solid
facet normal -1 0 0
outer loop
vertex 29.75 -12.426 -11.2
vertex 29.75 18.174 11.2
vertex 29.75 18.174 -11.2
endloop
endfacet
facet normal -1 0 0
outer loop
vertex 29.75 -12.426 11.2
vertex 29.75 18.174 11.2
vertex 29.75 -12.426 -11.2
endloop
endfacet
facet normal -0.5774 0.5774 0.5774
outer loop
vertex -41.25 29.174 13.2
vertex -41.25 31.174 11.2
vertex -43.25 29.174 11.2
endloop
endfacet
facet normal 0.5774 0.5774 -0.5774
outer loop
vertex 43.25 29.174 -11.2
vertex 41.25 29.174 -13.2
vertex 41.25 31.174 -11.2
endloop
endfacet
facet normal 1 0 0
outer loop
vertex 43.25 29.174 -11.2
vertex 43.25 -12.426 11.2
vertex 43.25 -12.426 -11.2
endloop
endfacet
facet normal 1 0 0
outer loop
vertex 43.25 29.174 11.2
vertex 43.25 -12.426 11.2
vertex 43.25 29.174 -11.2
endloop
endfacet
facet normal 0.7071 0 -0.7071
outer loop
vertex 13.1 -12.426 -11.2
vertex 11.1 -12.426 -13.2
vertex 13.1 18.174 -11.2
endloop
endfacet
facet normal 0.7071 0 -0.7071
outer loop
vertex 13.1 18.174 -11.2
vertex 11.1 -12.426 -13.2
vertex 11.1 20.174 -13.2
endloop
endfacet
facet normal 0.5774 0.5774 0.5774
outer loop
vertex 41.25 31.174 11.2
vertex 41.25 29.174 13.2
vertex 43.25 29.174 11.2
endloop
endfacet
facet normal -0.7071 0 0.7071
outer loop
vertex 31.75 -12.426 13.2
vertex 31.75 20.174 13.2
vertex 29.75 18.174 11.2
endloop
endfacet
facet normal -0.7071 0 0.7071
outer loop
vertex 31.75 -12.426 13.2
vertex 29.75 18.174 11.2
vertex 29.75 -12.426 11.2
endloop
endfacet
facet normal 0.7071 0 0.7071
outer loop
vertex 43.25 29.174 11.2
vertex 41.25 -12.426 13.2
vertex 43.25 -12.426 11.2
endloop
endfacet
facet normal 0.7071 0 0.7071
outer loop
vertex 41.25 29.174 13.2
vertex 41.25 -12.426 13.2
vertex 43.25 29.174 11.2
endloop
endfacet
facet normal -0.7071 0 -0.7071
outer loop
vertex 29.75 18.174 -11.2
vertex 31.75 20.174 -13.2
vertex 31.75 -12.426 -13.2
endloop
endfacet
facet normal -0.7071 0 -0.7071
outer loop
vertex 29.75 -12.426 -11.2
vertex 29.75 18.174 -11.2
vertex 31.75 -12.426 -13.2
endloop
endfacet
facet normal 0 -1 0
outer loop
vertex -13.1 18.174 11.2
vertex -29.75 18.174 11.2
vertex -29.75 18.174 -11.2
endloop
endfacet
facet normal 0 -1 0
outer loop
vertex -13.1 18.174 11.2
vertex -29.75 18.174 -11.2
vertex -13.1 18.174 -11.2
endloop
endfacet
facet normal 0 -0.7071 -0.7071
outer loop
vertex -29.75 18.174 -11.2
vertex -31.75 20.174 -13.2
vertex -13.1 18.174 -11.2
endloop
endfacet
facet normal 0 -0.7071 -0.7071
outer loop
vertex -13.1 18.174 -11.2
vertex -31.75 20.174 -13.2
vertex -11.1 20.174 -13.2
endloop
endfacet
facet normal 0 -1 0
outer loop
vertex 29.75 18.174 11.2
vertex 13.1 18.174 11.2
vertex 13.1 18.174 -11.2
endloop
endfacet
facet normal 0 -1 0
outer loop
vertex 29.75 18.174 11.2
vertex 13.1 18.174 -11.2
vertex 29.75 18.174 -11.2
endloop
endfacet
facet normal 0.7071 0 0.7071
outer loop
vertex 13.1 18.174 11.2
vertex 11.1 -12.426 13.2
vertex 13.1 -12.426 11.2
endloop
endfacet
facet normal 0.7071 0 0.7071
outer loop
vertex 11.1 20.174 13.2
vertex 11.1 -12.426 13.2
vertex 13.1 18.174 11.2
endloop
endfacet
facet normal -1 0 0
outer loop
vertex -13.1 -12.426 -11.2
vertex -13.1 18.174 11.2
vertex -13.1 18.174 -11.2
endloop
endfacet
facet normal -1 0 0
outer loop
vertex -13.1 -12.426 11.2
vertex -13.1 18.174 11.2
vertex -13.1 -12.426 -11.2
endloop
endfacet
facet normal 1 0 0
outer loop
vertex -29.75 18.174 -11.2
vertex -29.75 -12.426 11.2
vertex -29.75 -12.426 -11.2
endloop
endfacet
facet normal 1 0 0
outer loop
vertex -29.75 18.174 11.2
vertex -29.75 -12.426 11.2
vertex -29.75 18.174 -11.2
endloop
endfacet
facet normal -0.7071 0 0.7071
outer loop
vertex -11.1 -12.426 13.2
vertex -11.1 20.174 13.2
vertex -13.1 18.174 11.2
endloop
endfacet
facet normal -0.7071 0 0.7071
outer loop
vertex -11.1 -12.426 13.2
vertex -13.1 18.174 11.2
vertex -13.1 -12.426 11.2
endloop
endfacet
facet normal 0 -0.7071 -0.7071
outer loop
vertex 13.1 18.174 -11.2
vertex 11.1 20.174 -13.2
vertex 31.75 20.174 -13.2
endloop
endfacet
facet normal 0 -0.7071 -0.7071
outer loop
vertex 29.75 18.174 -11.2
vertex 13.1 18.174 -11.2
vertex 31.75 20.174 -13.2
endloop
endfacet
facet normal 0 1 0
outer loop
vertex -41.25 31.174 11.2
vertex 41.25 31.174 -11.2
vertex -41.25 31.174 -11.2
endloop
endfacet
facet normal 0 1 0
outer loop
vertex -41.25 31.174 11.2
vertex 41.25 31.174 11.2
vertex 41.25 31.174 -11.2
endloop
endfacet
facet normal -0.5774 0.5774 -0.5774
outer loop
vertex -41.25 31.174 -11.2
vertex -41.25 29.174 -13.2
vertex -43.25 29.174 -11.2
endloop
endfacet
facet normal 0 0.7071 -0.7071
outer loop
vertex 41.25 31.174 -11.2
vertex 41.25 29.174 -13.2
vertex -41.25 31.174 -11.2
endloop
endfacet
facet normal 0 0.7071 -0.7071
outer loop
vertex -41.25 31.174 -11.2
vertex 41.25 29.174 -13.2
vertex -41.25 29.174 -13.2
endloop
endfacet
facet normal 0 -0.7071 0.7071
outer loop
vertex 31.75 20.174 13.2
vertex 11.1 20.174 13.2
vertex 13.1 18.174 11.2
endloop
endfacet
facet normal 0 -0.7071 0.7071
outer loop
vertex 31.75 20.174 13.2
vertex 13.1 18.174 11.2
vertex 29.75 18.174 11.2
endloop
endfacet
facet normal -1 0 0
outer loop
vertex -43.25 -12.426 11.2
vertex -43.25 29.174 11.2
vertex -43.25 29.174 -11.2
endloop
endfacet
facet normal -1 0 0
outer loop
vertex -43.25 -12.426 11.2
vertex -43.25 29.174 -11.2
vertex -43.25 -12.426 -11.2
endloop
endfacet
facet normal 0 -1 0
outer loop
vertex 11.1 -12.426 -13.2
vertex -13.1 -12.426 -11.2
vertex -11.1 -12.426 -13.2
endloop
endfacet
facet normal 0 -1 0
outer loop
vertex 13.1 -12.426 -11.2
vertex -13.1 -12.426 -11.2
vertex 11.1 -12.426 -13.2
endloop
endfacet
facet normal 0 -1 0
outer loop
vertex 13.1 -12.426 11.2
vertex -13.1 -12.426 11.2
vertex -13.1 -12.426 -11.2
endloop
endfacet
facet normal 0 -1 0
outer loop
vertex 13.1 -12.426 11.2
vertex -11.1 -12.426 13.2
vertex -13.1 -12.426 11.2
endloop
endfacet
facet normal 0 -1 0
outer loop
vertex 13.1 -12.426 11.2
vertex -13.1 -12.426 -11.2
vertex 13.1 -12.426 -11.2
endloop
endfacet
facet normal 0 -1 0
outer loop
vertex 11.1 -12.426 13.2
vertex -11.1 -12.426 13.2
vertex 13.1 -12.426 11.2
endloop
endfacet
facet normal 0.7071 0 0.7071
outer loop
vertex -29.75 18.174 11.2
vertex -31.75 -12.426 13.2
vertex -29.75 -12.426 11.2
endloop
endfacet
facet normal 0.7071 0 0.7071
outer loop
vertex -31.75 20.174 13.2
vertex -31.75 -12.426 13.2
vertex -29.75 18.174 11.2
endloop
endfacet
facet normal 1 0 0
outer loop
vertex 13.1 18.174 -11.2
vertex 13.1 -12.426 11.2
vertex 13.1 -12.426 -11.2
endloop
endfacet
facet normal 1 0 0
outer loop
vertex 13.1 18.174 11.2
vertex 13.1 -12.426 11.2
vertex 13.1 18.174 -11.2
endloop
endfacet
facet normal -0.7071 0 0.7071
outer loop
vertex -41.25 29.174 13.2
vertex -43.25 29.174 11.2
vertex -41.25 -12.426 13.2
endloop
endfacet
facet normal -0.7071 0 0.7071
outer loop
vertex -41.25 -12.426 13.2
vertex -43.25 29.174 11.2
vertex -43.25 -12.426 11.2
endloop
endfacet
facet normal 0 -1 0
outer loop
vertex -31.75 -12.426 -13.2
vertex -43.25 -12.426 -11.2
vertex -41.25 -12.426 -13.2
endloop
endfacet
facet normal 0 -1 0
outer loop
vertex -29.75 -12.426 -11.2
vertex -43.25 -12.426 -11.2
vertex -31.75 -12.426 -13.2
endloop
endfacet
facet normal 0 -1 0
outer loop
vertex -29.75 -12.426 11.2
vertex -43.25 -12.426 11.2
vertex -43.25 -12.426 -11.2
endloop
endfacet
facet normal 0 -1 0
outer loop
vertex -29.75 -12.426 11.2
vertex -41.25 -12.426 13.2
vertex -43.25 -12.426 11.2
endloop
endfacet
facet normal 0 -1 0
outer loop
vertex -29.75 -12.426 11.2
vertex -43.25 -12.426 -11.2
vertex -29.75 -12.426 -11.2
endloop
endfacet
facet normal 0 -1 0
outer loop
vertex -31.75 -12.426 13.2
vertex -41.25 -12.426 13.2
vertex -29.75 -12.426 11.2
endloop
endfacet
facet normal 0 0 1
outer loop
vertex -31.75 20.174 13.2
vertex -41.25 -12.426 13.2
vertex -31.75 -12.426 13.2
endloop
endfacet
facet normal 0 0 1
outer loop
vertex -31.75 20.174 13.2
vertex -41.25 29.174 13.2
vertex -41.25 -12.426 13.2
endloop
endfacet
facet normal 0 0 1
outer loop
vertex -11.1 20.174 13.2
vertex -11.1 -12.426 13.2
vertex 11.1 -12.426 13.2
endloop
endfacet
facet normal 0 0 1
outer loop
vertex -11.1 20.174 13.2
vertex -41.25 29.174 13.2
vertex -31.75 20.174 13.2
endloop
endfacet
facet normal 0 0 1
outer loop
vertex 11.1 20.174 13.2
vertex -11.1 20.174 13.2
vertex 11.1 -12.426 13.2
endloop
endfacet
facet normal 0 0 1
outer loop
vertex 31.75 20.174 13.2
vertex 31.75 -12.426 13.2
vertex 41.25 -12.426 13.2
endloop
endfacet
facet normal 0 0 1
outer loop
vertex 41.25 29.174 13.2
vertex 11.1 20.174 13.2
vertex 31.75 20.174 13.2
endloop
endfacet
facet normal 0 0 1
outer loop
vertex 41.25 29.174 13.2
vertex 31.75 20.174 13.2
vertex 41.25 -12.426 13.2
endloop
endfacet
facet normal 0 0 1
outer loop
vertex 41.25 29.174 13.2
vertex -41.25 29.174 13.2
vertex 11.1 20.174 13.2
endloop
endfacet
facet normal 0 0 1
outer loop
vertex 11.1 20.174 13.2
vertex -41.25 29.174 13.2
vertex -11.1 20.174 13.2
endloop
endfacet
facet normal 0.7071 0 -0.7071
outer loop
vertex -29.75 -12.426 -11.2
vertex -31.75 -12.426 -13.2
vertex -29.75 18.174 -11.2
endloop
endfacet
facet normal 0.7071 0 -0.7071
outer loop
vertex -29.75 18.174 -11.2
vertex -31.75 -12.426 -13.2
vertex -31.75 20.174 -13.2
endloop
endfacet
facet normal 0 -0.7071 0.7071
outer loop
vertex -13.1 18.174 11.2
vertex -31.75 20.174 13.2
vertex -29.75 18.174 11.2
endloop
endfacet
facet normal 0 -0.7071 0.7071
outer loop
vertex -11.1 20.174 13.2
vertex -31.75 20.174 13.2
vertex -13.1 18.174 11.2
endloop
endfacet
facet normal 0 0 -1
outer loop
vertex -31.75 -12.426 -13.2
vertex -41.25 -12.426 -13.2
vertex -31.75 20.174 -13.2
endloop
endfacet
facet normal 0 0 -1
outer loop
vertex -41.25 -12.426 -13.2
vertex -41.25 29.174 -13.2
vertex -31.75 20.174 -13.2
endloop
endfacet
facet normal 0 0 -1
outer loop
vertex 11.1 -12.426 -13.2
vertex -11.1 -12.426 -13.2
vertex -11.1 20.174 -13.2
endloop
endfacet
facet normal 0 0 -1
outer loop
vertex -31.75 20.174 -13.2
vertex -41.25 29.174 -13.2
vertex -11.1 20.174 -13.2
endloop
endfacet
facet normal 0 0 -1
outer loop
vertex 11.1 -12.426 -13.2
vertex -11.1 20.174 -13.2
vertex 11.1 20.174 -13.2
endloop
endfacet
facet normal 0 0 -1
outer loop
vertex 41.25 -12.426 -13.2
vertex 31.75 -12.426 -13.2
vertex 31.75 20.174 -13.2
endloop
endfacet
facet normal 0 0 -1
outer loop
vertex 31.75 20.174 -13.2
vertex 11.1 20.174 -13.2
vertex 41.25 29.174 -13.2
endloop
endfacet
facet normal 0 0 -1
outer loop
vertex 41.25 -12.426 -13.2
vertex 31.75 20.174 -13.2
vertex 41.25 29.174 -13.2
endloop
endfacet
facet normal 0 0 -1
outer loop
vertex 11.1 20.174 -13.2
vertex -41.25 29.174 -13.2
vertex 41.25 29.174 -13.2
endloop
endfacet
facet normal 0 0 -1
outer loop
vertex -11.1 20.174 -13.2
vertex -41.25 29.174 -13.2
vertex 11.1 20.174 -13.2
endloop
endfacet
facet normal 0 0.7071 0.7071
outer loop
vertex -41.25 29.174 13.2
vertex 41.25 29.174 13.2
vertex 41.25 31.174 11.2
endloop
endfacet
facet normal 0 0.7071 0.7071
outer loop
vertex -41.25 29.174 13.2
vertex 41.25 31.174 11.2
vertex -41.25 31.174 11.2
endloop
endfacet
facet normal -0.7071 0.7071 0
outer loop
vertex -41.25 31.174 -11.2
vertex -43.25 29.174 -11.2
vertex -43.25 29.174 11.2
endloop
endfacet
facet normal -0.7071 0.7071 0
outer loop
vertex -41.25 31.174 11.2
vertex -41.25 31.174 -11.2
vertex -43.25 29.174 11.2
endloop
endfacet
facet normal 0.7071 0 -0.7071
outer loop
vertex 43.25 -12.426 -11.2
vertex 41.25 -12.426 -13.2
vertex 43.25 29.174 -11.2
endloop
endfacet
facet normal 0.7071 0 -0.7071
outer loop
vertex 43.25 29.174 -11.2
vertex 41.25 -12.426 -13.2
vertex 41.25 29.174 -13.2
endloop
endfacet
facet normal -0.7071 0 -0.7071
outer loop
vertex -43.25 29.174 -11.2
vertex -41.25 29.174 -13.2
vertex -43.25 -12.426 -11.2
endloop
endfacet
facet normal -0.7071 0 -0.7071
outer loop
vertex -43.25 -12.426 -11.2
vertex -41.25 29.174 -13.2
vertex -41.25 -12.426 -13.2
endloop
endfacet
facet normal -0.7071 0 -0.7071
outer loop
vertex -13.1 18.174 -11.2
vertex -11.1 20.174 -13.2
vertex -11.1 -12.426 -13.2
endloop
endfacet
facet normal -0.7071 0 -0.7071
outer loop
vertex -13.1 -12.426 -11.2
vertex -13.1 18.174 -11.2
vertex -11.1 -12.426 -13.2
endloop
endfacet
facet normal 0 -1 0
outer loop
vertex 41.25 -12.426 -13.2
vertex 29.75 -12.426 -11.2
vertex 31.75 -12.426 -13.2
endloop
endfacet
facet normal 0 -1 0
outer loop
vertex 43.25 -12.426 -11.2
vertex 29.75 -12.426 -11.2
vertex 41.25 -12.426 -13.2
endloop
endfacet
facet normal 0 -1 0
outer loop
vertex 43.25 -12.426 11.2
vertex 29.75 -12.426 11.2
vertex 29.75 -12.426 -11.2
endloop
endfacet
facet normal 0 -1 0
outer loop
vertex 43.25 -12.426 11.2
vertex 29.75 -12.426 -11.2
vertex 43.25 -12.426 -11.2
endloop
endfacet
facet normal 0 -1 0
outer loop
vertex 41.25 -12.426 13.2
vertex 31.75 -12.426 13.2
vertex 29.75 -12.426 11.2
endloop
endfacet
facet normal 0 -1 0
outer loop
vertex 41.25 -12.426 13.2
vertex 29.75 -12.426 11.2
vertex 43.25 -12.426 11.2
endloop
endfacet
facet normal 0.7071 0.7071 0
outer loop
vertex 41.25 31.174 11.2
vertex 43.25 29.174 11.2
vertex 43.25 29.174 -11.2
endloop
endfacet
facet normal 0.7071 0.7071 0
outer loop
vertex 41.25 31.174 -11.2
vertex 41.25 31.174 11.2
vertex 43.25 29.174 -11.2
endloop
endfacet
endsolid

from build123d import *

# Parameters (mm, degrees)
BOSS_EXTRUDE1_DEPTH = 13.2
CHAMFER1_SIZE       = 2


with BuildPart() as part:
    # Sketch1 → Boss-Extrude1 (new, symmetric)
    with BuildSketch(Plane.XY):
        Polygon((43.25, 31.173529412), (-43.25, 31.173529412), (-43.25, -12.426470588), (-29.75, -12.426470588), (-29.75, 18.173529412), (-13.1, 18.173529412), (-13.1, -12.426470588), (13.1, -12.426470588), (13.1, 18.173529412), (29.75, 18.173529412), (29.75, -12.426470588), (43.25, -12.426470588), align=None)
    extrude(amount=BOSS_EXTRUDE1_DEPTH, both=True)

    # Chamfer1
    chamfer1_edges = [part.edges().sort_by_distance(p)[0] for p in [
        (13.1, 2.873529412, -13.2),
        (-13.1, 2.873529412, -13.2),
        (-21.425, 18.173529412, -13.2),
        (-29.75, 2.873529412, -13.2),
        (-43.25, 9.373529412, -13.2),
        (0, 31.173529412, -13.2),
        (43.25, 9.373529412, -13.2),
        (29.75, 2.873529412, -13.2),
        (21.425, 18.173529412, -13.2),
        (43.25, 9.373529412, 13.2),
        (0, 31.173529412, 13.2),
        (-43.25, 31.173529412, 0),
        (43.25, 31.173529412, 0),
        (-43.25, 9.373529412, 13.2),
        (-29.75, 2.873529412, 13.2),
        (-21.425, 18.173529412, 13.2),
        (-13.1, 2.873529412, 13.2),
        (13.1, 2.873529412, 13.2),
        (21.425, 18.173529412, 13.2),
        (29.75, 2.873529412, 13.2),
    ]]
    chamfer(chamfer1_edges, length=CHAMFER1_SIZE)


solid = part.part
